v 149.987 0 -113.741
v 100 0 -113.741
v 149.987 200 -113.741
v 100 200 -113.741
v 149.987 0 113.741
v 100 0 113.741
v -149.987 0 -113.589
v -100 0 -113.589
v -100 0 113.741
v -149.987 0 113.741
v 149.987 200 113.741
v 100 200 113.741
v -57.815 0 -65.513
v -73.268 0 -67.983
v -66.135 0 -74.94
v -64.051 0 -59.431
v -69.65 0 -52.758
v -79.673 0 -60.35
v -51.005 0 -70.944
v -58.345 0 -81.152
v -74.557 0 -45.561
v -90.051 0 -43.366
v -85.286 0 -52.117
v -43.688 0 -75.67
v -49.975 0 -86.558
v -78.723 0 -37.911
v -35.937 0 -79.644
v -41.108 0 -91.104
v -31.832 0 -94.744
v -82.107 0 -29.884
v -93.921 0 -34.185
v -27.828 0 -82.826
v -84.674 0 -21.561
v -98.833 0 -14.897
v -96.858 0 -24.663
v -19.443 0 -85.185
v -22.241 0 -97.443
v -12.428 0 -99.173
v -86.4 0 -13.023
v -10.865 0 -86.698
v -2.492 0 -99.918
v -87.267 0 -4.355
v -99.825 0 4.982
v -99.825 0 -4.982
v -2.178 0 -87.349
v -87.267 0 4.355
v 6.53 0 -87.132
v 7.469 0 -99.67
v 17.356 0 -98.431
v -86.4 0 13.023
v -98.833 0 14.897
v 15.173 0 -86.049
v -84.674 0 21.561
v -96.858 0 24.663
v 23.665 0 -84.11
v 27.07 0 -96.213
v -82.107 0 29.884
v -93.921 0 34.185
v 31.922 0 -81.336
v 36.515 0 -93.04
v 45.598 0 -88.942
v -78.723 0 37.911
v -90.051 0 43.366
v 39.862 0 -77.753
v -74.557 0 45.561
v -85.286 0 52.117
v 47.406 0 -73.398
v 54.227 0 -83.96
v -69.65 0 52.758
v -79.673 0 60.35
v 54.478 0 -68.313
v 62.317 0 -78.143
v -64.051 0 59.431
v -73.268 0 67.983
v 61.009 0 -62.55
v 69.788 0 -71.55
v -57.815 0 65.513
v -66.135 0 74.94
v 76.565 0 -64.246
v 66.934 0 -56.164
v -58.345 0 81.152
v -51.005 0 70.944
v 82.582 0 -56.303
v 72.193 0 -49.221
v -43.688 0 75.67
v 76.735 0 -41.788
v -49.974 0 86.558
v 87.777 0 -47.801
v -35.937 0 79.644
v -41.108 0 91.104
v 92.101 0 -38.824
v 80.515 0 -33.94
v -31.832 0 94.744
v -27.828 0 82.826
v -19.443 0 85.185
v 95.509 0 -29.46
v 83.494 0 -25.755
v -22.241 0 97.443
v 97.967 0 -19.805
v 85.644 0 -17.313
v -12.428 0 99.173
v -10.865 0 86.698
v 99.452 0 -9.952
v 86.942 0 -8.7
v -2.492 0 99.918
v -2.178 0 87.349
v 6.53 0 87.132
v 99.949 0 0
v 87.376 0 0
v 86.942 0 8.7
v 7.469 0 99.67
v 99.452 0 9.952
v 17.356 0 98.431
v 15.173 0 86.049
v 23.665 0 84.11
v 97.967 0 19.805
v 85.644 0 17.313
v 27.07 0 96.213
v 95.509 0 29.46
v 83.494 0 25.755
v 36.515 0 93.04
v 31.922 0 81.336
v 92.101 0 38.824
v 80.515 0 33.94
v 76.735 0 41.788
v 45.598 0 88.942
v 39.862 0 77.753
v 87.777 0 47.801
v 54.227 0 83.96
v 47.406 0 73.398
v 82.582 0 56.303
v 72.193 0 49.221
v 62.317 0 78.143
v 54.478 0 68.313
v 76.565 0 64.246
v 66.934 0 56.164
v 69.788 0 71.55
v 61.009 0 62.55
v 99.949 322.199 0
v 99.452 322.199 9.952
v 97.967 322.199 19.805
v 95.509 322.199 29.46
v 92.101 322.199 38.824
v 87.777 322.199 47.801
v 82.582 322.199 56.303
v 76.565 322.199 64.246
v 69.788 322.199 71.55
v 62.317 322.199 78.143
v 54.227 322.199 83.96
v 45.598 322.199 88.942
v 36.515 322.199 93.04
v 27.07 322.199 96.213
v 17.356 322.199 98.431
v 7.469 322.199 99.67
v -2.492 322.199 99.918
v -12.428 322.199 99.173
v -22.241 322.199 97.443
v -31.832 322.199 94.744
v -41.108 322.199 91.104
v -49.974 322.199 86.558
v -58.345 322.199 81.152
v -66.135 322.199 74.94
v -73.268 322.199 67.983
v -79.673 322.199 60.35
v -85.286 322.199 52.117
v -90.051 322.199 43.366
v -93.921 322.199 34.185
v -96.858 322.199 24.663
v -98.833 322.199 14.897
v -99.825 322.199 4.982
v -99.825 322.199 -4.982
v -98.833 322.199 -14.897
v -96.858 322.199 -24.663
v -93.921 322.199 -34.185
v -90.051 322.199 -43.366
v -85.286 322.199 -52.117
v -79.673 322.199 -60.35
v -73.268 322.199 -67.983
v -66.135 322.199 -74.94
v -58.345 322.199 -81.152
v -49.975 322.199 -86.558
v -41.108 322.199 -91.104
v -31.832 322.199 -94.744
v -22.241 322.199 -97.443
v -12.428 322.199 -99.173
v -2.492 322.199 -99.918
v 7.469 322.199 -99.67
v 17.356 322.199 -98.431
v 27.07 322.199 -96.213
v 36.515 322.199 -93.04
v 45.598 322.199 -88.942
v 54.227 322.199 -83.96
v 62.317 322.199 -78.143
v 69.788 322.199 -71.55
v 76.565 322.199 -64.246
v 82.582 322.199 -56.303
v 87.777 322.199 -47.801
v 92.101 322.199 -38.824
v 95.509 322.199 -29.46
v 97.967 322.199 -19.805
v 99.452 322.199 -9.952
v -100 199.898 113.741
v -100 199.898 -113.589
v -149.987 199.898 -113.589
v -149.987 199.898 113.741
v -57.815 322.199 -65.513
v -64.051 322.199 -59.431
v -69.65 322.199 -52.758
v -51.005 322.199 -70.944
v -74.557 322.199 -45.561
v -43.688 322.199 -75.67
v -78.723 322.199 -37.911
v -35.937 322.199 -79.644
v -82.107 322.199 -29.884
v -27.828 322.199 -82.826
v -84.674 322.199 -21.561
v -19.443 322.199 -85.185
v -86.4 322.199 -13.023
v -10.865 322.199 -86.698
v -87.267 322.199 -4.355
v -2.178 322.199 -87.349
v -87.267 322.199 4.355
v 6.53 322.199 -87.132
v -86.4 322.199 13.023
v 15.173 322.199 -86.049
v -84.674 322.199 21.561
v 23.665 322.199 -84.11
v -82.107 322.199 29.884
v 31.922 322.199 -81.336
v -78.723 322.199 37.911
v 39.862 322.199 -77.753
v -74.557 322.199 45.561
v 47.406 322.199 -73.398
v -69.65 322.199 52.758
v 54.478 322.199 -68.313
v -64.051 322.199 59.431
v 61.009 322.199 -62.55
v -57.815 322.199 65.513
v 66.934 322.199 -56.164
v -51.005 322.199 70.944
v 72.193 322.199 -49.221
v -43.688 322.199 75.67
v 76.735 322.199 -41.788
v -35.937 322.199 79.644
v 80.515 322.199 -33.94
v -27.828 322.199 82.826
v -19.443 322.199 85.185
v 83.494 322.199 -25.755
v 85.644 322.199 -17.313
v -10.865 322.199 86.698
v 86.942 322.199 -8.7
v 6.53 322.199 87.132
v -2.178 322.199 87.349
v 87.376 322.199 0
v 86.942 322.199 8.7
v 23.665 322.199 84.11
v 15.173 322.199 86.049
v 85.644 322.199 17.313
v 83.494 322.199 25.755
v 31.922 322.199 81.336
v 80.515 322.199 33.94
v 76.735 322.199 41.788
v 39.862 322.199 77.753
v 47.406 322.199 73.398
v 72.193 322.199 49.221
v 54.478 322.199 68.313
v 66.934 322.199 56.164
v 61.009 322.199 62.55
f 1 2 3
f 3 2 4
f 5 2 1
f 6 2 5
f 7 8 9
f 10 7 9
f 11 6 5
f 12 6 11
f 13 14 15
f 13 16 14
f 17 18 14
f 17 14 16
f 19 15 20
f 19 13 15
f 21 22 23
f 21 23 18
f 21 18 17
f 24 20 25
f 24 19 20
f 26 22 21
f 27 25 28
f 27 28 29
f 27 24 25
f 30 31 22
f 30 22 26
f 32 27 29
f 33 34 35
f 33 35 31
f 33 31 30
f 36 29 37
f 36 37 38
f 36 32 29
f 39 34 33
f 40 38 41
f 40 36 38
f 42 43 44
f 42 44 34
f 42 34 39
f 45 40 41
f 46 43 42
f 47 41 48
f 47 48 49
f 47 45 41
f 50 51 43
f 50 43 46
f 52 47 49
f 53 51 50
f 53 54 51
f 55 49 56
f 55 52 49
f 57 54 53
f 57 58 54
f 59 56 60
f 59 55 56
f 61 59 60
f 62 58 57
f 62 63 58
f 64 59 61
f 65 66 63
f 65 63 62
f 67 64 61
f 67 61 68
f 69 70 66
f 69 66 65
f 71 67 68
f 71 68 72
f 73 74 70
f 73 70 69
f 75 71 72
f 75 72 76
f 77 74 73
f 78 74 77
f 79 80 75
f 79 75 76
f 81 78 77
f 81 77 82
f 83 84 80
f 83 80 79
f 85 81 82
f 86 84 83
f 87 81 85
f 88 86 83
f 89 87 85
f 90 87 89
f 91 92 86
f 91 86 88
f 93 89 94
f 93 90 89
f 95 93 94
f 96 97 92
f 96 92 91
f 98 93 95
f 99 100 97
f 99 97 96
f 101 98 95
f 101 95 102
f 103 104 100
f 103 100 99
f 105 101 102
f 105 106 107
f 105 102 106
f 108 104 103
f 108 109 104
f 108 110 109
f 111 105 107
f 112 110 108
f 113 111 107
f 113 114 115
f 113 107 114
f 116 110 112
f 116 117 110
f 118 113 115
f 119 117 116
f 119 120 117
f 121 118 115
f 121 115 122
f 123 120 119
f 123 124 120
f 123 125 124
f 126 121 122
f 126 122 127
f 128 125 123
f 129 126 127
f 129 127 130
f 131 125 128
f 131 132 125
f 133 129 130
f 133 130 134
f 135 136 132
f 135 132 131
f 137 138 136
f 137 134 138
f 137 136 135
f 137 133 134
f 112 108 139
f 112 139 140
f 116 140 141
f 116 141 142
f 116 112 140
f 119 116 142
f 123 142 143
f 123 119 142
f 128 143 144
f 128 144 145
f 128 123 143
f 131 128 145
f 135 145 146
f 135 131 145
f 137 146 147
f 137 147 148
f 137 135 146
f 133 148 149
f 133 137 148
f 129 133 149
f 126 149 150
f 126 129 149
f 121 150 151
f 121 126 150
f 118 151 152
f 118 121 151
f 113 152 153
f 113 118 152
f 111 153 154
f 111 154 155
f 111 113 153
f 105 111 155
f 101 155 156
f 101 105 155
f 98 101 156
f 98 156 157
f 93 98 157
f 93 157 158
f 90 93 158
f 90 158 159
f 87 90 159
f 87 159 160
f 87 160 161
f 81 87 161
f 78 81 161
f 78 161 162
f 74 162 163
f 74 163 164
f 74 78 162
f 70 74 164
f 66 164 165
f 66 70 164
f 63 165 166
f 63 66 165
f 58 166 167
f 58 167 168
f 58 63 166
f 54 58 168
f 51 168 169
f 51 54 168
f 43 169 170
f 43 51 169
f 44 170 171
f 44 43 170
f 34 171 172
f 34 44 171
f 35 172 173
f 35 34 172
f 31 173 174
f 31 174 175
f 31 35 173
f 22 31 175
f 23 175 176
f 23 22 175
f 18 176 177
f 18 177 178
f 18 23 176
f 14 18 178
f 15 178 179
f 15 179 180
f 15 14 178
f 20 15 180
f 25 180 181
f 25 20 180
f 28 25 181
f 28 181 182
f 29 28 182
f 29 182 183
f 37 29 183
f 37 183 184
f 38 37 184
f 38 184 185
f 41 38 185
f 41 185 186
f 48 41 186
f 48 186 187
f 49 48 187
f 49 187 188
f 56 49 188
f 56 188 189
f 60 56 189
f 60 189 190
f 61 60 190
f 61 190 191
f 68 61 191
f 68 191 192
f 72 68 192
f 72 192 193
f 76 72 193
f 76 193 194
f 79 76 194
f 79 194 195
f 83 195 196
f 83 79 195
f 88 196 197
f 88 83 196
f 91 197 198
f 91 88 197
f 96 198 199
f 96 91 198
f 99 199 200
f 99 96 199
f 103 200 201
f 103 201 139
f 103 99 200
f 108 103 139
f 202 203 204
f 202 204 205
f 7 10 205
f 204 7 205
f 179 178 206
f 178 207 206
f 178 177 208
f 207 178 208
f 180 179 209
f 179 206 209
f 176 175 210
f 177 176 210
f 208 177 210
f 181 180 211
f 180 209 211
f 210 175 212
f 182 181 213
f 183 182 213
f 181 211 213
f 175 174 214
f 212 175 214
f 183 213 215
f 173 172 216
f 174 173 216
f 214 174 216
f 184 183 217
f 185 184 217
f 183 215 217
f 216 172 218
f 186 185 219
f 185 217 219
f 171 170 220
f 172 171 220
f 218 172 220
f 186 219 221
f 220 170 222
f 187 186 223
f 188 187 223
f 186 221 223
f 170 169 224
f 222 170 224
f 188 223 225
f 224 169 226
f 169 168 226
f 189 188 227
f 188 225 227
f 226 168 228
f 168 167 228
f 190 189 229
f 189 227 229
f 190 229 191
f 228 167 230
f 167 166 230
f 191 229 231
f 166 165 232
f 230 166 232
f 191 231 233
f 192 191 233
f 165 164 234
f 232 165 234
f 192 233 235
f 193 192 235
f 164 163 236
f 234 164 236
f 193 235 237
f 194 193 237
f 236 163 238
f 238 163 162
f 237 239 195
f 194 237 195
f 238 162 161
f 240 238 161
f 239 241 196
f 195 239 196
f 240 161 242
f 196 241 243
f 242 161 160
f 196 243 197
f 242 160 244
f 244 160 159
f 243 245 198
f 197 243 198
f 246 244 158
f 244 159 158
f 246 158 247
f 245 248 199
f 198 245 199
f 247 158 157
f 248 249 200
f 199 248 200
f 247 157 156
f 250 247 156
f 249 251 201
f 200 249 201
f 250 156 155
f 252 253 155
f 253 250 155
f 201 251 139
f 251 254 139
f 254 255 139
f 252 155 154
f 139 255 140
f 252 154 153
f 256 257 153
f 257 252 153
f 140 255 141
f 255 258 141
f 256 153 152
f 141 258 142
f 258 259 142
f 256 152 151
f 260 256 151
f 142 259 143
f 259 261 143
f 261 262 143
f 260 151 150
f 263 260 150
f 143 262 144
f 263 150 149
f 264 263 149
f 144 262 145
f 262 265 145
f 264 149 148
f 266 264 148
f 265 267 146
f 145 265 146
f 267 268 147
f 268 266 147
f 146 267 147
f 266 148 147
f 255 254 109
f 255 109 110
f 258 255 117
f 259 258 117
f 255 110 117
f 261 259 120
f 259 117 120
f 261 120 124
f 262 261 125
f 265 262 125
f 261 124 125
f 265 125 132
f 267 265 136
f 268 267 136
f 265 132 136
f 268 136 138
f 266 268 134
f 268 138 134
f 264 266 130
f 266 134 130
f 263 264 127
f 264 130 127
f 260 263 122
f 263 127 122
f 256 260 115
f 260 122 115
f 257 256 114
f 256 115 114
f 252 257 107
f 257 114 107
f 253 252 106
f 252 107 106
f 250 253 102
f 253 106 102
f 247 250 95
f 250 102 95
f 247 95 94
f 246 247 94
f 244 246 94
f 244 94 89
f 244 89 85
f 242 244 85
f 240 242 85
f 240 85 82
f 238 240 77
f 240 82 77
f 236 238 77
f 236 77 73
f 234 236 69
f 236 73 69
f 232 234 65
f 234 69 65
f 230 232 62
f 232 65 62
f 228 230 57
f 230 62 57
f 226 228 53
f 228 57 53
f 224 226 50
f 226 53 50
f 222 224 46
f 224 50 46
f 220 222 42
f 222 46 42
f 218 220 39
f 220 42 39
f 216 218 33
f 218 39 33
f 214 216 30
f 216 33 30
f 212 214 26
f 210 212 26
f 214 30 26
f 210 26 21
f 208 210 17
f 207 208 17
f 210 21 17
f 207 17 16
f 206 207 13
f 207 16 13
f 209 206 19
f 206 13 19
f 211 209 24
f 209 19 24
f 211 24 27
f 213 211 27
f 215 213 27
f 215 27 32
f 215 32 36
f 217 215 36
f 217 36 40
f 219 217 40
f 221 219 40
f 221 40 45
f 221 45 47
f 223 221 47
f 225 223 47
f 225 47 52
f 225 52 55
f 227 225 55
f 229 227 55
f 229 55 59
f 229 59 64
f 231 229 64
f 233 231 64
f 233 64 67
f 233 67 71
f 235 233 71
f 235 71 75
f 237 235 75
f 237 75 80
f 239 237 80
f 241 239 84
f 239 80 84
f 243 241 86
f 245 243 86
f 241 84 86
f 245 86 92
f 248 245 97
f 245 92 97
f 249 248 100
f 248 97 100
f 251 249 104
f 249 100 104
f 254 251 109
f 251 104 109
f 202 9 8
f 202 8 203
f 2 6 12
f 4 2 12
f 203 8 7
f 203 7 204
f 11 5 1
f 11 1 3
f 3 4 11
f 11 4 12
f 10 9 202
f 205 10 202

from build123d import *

# Parameters (mm, degrees)
F0_R     = 99.949
F1_DEPTH = 322.199
F3_W     = 199.9996
F3_H     = 227.4824
F4_DEPTH = 49.9872
F6_W     = 199.898
F6_H     = 227.33
F7_DEPTH = 49.9872
F8_R     = 87.376
F9_DEPTH = 322.199


with BuildPart() as f1:
    # F0 (on Front) → F1 (new body)
    with BuildSketch(Plane.XZ):
        Circle(F0_R)
    extrude(amount=-F1_DEPTH)

    # F8 (on Front) → F9 (cut, through all)
    with BuildSketch(Plane.XZ):
        Circle(F8_R)
    extrude(amount=-F9_DEPTH, mode=Mode.SUBTRACT)


with BuildPart() as f4:
    # F3 (on offset) → F4 (new body)
    with BuildSketch(Plane.YZ.offset(99.9998)):
        with Locations((99.9998, 0)):
            Rectangle(F3_W, F3_H)
    extrude(amount=F4_DEPTH)


with BuildPart() as f7:
    # F6 (on offset) → F7 (new body)
    with BuildSketch(Plane.YZ.offset(-99.9998)):
        with Locations((99.949, 0.0762)):
            Rectangle(F6_W, F6_H)
    extrude(amount=-F7_DEPTH)


solid = Compound([f1.part, f4.part, f7.part])
